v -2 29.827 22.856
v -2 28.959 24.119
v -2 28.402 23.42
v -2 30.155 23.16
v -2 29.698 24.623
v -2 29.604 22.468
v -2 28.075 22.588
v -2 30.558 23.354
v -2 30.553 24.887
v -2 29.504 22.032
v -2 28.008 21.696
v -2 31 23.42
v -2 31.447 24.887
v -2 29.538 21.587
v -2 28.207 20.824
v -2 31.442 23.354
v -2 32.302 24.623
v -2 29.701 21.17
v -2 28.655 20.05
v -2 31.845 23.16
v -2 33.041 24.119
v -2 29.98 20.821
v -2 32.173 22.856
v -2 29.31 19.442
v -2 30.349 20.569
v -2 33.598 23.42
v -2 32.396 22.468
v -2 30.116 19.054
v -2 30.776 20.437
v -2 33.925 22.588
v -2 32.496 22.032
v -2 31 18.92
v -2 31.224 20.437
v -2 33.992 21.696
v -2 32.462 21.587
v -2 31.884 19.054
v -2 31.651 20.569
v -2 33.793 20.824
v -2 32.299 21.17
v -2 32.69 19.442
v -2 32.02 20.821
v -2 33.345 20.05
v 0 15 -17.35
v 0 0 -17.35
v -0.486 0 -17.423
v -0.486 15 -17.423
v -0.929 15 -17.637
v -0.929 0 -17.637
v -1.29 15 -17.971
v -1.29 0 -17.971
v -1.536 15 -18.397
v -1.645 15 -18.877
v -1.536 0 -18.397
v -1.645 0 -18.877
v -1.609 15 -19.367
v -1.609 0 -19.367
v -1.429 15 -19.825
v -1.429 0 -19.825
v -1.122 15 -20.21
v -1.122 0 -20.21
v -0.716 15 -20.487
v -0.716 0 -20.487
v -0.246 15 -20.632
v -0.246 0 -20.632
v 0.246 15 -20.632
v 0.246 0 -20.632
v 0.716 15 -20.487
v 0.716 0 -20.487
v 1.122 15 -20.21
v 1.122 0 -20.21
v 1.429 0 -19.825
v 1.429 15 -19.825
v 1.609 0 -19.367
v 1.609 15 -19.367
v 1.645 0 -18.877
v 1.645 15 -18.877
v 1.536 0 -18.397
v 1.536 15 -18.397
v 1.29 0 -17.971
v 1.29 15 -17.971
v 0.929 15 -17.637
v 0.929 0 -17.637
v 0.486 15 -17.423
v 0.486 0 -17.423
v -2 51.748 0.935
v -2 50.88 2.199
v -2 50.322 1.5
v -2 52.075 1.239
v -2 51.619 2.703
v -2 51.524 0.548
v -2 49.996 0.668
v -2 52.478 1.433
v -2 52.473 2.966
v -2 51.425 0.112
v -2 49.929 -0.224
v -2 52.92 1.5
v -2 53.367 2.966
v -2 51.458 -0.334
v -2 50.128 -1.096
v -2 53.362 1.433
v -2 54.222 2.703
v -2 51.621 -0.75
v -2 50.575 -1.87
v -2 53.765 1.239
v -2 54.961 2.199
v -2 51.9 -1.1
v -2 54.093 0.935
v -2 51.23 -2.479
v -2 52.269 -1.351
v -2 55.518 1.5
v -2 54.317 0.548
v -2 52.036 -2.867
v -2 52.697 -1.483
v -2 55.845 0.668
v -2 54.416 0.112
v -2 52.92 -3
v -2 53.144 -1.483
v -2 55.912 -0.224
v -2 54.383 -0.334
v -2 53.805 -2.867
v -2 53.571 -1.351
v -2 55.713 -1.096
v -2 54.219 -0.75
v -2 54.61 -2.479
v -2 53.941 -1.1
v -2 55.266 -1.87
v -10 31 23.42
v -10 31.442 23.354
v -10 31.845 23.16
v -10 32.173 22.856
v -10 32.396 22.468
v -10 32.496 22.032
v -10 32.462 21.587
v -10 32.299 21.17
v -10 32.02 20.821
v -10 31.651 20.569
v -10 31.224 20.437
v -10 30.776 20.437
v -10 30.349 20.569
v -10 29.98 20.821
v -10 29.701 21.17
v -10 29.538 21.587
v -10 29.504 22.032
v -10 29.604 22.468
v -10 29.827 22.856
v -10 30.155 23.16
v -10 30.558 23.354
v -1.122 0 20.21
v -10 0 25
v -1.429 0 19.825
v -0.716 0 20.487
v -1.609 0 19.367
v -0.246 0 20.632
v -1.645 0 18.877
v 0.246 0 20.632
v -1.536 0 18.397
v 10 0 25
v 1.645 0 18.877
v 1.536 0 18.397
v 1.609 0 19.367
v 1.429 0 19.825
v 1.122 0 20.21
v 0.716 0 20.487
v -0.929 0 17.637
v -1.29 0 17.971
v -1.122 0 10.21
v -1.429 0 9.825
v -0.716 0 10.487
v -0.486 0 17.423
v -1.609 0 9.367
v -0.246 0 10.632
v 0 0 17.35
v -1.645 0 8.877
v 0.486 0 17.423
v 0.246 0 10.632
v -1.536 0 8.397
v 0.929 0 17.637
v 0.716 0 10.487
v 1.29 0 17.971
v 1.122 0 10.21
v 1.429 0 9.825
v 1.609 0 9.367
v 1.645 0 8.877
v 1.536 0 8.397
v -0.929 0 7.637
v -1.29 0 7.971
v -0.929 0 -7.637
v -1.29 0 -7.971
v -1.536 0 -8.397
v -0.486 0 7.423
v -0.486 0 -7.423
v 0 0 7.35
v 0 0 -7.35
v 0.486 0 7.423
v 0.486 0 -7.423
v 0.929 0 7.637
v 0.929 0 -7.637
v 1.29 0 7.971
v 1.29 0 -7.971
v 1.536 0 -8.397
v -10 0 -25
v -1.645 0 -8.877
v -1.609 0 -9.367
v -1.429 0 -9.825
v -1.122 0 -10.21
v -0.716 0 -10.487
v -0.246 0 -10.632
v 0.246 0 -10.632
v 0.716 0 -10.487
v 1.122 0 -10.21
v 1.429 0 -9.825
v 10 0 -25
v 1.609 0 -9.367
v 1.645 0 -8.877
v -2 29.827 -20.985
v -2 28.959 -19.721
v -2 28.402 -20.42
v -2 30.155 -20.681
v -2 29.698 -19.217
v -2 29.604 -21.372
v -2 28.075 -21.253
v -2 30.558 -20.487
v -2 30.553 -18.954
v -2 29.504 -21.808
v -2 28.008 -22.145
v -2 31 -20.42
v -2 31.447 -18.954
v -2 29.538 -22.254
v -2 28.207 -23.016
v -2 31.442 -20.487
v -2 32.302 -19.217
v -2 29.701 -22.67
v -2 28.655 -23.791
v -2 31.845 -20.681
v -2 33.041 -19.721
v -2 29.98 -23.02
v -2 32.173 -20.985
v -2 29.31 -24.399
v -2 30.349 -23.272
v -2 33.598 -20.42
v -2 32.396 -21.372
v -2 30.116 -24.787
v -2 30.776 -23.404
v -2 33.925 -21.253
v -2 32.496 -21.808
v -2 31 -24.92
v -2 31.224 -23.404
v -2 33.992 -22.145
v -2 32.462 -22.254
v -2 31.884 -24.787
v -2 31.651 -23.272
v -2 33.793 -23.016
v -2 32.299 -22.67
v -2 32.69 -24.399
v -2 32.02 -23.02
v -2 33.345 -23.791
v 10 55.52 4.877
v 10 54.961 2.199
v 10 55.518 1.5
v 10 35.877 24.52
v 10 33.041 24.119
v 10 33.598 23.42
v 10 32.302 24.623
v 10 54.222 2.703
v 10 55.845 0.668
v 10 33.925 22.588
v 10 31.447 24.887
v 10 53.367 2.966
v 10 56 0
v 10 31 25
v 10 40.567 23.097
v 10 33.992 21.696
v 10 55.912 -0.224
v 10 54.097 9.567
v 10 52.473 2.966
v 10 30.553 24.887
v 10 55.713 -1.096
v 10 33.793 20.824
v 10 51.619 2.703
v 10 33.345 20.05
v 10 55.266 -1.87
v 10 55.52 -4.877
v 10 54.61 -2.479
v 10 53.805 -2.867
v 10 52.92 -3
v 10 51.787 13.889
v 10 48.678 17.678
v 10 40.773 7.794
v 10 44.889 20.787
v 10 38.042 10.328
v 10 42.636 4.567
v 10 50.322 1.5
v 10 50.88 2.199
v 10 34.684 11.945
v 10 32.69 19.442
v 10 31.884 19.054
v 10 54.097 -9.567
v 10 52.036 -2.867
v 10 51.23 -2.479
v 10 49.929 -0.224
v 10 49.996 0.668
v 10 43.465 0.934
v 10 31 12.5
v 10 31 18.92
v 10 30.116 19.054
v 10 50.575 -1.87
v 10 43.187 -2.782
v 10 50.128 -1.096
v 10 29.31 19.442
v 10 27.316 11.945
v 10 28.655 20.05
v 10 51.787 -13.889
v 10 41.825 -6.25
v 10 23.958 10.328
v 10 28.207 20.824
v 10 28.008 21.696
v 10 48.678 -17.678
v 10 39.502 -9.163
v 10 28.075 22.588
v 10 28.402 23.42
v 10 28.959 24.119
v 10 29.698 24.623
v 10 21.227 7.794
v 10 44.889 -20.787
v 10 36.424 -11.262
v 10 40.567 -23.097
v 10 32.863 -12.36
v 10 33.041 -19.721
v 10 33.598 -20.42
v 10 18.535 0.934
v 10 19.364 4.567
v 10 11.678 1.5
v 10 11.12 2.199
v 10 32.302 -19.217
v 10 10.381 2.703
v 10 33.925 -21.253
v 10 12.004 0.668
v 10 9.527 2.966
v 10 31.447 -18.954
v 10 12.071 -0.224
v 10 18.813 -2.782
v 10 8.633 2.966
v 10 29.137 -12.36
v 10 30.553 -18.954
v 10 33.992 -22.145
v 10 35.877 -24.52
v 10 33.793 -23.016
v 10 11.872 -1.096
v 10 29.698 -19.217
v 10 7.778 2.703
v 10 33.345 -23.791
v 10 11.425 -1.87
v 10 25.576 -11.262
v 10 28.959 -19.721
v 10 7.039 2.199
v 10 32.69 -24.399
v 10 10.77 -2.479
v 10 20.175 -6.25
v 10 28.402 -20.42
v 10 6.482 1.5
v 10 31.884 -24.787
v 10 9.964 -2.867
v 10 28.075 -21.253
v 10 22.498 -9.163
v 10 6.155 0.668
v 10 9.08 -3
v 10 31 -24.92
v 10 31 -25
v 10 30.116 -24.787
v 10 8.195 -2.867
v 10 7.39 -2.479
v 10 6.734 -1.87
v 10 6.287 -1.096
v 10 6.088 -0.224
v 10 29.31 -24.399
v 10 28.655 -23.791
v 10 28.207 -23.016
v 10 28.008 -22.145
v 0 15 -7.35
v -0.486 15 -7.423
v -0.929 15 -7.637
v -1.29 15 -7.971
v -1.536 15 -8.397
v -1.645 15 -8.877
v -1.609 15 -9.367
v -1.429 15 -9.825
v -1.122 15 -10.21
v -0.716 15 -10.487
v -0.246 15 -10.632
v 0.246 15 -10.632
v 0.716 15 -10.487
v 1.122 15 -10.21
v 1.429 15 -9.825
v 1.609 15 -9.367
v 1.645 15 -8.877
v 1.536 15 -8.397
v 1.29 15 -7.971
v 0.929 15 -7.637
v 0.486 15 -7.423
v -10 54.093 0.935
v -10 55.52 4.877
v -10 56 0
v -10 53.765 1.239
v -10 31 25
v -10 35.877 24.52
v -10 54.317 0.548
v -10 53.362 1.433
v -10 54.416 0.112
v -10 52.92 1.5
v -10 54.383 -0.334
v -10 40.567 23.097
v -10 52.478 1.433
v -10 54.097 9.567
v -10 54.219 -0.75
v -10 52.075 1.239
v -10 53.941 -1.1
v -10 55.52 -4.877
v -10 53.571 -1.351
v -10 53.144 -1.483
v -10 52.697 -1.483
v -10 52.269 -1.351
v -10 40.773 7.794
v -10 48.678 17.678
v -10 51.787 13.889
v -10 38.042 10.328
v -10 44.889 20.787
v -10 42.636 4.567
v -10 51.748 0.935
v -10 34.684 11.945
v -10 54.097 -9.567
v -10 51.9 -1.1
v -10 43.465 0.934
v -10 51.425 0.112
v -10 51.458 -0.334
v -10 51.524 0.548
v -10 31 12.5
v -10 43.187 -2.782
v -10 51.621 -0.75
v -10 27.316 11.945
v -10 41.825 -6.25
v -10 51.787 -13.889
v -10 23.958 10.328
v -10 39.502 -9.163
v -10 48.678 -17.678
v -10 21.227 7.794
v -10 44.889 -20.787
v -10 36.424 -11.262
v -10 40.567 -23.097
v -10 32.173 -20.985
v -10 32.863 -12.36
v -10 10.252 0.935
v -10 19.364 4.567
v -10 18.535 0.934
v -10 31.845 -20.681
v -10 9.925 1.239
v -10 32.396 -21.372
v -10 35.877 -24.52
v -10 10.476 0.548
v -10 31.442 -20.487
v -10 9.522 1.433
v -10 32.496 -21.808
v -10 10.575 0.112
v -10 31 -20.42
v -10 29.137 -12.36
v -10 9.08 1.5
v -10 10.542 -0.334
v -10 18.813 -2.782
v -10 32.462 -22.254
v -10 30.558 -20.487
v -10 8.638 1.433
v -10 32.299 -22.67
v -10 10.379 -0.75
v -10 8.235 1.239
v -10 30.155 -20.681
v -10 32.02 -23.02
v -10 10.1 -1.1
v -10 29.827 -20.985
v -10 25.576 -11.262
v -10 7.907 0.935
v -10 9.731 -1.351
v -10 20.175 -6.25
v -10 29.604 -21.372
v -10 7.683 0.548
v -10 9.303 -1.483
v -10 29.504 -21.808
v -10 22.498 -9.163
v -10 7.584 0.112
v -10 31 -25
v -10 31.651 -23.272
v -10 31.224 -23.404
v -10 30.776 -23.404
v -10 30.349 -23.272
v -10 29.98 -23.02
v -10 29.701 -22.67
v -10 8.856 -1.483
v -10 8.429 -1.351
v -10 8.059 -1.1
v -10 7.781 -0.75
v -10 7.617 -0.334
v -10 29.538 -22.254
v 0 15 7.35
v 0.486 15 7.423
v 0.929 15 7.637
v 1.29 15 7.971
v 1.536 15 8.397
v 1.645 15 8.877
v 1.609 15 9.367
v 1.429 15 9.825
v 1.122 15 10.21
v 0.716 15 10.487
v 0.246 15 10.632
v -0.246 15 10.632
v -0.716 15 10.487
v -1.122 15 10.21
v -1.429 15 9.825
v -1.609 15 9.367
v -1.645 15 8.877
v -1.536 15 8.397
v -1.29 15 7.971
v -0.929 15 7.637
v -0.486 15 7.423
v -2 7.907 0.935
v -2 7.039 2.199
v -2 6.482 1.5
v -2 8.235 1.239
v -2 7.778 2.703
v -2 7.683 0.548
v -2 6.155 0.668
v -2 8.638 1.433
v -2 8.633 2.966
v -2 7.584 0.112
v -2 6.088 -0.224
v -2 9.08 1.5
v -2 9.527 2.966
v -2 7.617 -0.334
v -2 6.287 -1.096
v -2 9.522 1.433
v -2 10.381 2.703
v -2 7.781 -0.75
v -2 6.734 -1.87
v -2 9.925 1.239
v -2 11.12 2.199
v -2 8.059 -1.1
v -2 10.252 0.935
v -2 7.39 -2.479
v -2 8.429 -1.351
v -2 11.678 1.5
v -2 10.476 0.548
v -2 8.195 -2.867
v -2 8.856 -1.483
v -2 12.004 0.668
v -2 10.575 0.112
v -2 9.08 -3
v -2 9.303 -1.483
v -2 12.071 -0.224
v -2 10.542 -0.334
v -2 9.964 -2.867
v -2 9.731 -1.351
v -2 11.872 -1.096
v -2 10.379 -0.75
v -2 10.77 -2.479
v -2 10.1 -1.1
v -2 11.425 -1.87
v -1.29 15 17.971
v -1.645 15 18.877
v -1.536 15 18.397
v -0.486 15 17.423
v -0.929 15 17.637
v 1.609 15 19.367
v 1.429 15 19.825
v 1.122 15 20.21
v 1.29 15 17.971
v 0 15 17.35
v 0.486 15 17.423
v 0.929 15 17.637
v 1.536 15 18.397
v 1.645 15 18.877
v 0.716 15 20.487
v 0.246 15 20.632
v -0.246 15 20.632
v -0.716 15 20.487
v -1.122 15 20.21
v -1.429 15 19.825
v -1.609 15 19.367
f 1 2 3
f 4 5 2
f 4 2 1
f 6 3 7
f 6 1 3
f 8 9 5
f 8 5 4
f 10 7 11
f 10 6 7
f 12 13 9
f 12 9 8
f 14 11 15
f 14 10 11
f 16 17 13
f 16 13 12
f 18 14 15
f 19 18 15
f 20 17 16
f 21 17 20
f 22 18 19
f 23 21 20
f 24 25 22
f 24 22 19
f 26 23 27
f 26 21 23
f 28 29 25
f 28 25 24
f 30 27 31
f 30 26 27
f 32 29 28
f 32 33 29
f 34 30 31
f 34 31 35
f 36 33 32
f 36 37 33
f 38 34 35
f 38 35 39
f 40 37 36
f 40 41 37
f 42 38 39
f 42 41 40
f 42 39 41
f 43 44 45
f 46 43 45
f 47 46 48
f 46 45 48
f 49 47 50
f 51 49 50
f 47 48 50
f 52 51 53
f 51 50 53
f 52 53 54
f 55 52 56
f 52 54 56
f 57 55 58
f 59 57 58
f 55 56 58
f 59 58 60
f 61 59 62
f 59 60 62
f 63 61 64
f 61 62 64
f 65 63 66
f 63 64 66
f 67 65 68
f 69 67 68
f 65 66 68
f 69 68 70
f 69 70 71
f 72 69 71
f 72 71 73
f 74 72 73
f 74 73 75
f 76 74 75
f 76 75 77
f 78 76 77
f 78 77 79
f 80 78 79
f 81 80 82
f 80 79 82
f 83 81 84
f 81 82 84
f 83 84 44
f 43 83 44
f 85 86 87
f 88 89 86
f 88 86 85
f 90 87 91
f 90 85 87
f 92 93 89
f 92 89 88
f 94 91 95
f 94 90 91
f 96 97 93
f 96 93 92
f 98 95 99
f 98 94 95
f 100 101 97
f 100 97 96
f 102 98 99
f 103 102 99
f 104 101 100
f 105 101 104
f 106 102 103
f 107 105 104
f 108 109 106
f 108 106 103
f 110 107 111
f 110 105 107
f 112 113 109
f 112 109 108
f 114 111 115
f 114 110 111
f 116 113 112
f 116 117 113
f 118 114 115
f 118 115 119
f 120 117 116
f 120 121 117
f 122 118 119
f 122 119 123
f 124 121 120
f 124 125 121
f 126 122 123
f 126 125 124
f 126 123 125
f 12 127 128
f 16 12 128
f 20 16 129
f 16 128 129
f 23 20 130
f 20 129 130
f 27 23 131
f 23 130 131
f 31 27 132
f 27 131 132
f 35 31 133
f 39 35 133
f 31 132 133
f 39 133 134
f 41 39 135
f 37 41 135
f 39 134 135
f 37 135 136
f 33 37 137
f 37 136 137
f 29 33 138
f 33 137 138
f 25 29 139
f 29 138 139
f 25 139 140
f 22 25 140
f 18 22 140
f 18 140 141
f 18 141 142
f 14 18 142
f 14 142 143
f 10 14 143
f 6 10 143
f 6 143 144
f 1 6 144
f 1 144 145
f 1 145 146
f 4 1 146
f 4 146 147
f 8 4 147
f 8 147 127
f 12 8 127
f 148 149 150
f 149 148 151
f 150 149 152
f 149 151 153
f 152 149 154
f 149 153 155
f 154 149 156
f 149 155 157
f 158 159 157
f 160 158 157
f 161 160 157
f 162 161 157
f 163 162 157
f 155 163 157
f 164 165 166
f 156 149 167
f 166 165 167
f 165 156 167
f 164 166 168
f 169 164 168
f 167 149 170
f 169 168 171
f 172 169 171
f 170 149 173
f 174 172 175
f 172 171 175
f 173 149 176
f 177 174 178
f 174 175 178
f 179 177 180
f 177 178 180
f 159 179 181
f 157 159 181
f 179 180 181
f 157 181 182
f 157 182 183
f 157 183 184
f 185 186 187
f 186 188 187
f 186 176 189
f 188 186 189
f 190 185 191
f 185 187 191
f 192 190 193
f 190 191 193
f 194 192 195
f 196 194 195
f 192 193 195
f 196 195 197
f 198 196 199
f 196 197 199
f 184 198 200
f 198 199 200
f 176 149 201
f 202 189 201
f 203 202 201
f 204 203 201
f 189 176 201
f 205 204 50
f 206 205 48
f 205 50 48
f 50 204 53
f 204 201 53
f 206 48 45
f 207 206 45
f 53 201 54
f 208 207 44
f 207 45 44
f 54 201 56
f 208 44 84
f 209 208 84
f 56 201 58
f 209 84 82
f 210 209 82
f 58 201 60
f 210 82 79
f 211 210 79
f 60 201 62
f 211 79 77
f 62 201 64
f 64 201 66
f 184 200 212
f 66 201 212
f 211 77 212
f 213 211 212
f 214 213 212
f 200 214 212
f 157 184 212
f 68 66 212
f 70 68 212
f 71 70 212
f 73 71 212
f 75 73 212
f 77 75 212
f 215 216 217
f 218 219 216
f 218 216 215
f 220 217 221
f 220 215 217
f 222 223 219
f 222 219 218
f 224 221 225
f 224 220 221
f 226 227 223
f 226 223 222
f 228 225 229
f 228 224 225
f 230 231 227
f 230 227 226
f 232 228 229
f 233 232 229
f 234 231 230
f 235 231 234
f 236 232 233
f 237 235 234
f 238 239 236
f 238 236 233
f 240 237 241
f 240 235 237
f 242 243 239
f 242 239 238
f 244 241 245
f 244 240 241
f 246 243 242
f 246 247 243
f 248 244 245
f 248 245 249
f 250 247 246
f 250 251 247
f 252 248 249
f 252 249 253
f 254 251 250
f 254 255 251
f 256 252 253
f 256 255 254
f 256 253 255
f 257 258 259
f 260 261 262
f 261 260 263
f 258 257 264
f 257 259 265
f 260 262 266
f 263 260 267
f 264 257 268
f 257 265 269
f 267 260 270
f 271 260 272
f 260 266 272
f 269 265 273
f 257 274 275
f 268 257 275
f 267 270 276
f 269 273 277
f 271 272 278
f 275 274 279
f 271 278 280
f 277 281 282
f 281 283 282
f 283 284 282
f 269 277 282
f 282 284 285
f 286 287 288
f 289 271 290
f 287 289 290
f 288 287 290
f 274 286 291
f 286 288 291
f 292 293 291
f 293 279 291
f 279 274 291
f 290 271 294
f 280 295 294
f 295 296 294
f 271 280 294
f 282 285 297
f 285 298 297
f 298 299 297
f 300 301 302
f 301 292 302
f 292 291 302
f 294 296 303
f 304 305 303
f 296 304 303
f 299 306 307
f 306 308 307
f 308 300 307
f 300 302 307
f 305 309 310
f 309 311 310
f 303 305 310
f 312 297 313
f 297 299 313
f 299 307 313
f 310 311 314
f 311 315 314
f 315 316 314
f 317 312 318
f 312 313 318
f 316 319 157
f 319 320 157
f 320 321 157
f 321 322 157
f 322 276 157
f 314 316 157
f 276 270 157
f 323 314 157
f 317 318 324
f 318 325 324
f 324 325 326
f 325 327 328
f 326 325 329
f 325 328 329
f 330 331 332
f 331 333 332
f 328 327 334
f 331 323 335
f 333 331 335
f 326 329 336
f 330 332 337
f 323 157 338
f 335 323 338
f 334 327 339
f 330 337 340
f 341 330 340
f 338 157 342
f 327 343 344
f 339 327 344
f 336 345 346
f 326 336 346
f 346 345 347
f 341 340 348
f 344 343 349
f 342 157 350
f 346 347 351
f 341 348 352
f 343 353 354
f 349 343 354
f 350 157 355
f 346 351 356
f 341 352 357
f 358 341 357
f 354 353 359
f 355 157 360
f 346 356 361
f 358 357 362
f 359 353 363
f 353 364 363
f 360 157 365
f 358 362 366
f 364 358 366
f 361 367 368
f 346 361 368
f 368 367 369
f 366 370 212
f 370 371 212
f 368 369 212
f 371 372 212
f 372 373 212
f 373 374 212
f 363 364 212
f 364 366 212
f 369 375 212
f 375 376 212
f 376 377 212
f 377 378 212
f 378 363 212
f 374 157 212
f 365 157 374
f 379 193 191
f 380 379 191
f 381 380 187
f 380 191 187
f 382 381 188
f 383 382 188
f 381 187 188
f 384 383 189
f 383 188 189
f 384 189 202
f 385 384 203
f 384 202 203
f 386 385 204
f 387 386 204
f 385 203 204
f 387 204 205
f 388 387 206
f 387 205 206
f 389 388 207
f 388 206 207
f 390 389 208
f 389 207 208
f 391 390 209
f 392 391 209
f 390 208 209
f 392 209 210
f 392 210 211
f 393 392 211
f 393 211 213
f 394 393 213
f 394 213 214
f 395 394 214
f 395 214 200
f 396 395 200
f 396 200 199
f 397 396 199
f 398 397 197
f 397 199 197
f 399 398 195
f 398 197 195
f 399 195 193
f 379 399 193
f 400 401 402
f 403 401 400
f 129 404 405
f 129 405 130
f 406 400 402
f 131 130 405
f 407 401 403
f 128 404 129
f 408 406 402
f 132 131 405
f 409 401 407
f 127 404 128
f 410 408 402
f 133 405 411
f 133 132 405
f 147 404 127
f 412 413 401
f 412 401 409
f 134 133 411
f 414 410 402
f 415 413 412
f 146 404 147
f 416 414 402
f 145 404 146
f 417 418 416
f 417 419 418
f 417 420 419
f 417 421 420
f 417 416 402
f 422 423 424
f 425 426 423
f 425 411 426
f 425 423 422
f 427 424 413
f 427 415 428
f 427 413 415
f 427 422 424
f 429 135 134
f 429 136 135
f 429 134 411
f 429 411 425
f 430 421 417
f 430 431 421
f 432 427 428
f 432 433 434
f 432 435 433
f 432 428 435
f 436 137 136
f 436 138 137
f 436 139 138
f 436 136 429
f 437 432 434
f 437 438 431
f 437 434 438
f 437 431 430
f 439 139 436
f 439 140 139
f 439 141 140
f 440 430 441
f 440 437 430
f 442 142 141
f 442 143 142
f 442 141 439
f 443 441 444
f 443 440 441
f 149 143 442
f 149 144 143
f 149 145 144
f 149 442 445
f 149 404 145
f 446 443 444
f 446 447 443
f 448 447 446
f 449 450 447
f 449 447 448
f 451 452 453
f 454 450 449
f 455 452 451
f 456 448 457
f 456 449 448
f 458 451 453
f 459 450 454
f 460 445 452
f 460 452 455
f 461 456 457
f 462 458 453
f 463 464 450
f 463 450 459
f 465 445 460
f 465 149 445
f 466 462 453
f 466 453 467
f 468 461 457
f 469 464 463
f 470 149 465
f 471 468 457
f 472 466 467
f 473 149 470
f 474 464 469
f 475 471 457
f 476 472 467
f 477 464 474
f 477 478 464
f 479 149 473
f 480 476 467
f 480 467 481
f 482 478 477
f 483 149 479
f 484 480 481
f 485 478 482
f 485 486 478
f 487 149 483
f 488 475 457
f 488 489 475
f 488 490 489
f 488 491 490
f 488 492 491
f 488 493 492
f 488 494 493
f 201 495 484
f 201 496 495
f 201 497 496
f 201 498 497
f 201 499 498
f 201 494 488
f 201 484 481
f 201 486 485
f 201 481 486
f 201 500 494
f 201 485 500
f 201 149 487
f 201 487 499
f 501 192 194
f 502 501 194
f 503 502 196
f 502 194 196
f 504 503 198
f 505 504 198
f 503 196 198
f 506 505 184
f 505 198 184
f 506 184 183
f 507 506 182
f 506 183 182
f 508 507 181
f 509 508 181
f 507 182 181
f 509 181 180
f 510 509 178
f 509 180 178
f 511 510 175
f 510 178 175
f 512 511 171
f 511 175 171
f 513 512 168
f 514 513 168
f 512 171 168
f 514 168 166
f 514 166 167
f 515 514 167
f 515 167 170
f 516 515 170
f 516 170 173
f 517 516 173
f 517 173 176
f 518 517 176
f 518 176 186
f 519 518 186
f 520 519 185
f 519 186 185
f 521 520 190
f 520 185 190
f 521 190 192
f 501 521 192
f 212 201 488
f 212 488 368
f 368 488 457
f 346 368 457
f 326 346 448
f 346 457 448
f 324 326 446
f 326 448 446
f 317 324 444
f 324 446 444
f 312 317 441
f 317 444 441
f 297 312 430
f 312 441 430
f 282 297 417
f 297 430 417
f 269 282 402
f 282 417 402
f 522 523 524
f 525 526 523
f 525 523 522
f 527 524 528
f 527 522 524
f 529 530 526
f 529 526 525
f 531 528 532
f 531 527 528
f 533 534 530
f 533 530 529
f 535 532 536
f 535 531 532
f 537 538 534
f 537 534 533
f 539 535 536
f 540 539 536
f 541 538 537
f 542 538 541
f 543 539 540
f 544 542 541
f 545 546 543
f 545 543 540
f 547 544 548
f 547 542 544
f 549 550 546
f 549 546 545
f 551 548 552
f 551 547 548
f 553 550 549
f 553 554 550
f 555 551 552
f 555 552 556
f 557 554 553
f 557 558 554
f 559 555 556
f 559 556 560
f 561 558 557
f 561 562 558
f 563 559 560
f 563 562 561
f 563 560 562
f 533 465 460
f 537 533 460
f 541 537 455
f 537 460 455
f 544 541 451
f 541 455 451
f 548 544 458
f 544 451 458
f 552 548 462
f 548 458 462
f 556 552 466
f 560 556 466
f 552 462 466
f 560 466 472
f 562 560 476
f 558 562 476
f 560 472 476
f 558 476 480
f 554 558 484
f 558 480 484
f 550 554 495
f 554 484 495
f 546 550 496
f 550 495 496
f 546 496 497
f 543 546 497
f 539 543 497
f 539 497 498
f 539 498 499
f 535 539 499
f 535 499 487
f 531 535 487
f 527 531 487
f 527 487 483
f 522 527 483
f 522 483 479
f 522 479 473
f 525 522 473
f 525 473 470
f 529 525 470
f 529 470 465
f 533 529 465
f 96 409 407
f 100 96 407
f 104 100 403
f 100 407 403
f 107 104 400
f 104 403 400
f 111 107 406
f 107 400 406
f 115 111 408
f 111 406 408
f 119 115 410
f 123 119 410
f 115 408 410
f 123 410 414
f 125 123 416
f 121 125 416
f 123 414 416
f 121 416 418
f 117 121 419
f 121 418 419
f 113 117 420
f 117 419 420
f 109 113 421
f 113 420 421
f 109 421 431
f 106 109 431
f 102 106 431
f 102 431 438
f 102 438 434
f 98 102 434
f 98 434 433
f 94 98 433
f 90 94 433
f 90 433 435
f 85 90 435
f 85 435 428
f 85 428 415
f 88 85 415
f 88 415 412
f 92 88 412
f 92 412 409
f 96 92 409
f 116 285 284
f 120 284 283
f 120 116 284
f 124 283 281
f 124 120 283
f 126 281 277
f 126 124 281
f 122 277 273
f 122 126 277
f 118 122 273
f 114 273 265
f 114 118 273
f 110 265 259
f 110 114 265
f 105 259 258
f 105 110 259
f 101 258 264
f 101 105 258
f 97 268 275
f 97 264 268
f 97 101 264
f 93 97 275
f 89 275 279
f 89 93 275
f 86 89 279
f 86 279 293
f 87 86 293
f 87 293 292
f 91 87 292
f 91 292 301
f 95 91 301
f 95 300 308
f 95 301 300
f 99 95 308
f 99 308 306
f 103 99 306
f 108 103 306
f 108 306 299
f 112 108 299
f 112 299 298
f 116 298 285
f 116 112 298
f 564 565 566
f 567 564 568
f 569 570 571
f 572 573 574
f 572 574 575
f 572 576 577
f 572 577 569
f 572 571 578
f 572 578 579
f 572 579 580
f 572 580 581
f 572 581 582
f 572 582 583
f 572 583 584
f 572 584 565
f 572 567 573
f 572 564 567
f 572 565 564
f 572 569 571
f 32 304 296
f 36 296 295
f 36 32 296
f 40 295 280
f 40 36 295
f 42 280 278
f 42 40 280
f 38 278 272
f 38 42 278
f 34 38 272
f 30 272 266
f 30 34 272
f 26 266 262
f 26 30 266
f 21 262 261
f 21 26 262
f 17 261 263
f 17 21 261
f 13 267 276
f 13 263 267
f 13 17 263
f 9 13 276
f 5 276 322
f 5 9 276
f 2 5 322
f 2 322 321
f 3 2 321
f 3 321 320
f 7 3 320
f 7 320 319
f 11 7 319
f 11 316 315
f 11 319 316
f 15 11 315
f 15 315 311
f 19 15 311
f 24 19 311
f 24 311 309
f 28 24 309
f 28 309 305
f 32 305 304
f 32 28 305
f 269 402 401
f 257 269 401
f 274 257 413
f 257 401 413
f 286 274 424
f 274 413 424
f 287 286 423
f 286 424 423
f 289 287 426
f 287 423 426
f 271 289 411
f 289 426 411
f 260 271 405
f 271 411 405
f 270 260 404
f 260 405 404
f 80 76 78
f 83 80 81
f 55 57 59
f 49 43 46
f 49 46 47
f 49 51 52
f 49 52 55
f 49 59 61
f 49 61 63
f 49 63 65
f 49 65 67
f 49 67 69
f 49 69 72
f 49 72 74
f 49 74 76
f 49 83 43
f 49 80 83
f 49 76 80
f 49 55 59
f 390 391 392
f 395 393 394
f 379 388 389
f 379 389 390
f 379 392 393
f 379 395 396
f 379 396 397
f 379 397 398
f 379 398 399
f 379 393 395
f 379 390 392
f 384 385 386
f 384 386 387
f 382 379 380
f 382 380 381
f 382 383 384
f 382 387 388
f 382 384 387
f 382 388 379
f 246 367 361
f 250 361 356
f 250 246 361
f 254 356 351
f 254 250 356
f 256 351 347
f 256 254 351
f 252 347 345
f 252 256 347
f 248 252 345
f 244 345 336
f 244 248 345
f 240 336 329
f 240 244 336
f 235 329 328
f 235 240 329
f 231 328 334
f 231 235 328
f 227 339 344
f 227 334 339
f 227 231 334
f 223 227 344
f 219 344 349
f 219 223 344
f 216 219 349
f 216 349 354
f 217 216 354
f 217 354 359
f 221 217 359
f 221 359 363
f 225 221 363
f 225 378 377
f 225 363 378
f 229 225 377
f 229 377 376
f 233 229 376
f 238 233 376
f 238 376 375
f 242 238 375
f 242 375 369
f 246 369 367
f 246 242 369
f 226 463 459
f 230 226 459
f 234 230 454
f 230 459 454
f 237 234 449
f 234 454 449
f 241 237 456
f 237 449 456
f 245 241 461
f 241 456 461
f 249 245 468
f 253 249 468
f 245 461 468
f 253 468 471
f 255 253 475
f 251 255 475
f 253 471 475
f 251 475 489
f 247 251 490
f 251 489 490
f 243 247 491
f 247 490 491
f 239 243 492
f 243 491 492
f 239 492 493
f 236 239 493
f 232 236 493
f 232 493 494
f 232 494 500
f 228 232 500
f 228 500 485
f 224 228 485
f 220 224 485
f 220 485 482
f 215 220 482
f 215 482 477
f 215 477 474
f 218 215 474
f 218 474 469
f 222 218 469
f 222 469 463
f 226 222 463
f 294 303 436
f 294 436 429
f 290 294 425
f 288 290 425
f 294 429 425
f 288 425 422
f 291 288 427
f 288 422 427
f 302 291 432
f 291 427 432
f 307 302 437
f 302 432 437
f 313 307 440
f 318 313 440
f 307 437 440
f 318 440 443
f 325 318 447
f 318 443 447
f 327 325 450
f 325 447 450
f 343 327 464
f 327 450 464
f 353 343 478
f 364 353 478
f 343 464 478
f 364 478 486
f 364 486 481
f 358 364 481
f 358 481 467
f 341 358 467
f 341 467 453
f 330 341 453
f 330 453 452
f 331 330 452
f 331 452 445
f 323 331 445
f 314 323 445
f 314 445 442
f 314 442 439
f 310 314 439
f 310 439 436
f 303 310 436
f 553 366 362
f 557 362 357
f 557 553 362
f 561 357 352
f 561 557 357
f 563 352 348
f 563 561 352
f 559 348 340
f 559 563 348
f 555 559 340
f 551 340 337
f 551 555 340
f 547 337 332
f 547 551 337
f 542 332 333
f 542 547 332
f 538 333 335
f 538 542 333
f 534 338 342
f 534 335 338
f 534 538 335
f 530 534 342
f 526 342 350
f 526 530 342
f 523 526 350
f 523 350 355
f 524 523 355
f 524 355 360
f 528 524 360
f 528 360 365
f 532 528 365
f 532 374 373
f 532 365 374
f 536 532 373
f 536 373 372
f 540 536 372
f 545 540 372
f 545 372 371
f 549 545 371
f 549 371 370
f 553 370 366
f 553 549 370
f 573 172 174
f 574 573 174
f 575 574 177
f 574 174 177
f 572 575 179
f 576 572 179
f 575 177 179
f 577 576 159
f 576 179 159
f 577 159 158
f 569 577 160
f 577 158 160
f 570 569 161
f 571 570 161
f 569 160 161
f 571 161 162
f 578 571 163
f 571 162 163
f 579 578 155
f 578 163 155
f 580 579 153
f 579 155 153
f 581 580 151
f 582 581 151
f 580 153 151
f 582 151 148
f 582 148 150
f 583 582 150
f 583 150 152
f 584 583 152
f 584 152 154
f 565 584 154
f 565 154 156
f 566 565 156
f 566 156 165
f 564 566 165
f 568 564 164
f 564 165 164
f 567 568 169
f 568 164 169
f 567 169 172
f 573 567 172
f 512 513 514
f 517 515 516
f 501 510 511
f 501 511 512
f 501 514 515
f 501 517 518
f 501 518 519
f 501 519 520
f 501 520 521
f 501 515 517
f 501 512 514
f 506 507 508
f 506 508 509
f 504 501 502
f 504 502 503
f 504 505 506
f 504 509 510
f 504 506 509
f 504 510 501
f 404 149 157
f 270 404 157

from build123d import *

# Parameters (mm, degrees)
SKIZZE1_W                            = 20
SKIZZE1_H                            = 50
AUFSATZ_LINEAR_AUSTRAGEN1_DEPTH      = 56
SKIZZE2_R                            = 12.5
SCHNITT_LINEAR_AUSTRAGEN1_DEPTH      = 65.505813691
SKIZZE3_R                            = 1.65
SCHNITT_LINEAR_AUSTRAGEN2_DEPTH      = 15
SKIZZE4_R                            = 1.5
SCHNITT_LINEAR_AUSTRAGEN3_DEPTH      = 20
SCHNITT_LINEAR_AUSTRAGEN4_DEPTH      = 65.505813691
SCHNITT_LINEAR_AUSTRAGEN4_DEPTH_BACK = 12
SKIZZE5_R                            = 12.5
SKIZZE5_R_2                          = 3


with BuildPart() as part:
    # Skizze1 → Aufsatz-Linear austragen1 (new body)
    with BuildSketch(Plane(origin=(0, 0, 0), x_dir=(1, 0, 0), z_dir=(0, 1, 0))):
        Rectangle(SKIZZE1_W, SKIZZE1_H)
    extrude(amount=AUFSATZ_LINEAR_AUSTRAGEN1_DEPTH)

    # Skizze2 → Schnitt-Linear austragen1 (cut, through all)
    with BuildSketch(Plane.ZY.offset(10)):
        with BuildLine():
            Line((-25, 56), (-25, 31))
            ThreePointArc((-25, 31), (-17.677669509, 48.67766955), (5.8e-08, 56))
            Line((5.8e-08, 56), (-25, 56))
        make_face()
        with BuildLine():
            ThreePointArc((5.8e-08, 56), (17.67766955, 48.677669509), (25, 31))
            Line((25, 31), (25, 56))
            Line((25, 56), (5.8e-08, 56))
        make_face()
        with Locations((0, 31)):
            Circle(SKIZZE2_R)
    extrude(amount=-SCHNITT_LINEAR_AUSTRAGEN1_DEPTH, mode=Mode.SUBTRACT)

    # Skizze3 → Schnitt-Linear austragen2 (cut)
    with BuildSketch(Plane.XZ):
        with Locations(Location((0, 19, 0), (0, 0, 270))):
            Circle(SKIZZE3_R)
        with Locations(Location((0, 9, 0), (0, 0, 270))):
            Circle(SKIZZE3_R)
        with Locations(Location((0, -9, 0), (0, 0, 90))):
            Circle(SKIZZE3_R)
        with Locations(Location((0, -19, 0), (0, 0, 90))):
            Circle(SKIZZE3_R)
    extrude(amount=-SCHNITT_LINEAR_AUSTRAGEN2_DEPTH, mode=Mode.SUBTRACT)

    # Skizze4 → Schnitt-Linear austragen3 (cut)
    with BuildSketch(Plane.ZY.offset(10)):
        with Locations((-21.920310217, 31)):
            Circle(SKIZZE4_R)
        with Locations((0, 52.920310217)):
            Circle(SKIZZE4_R)
        with Locations((21.920310217, 31)):
            Circle(SKIZZE4_R)
        with Locations((0, 9.079689783)):
            Circle(SKIZZE4_R)
    extrude(amount=-SCHNITT_LINEAR_AUSTRAGEN3_DEPTH, mode=Mode.SUBTRACT)

    # Skizze5 → Schnitt-Linear austragen4 (cut, two sides: drawn at the far end of the back side and taken through both)
    with BuildSketch(Plane(origin=(10, 0, 0), x_dir=(0, 0, -1), z_dir=(1, 0, 0)).offset(-SCHNITT_LINEAR_AUSTRAGEN4_DEPTH_BACK)):
        with Locations(Location((0, 31, 0), (0, 0, 180))):
            Circle(SKIZZE5_R)
        with Locations((21.920310217, 31)):
            Circle(SKIZZE5_R_2)
        with Locations((0, 9.079689783)):
            Circle(SKIZZE5_R_2)
        with Locations((-21.920310217, 31)):
            Circle(SKIZZE5_R_2)
        with Locations((0, 52.920310217)):
            Circle(SKIZZE5_R_2)
    extrude(amount=SCHNITT_LINEAR_AUSTRAGEN4_DEPTH + SCHNITT_LINEAR_AUSTRAGEN4_DEPTH_BACK, mode=Mode.SUBTRACT)


solid = part.part
